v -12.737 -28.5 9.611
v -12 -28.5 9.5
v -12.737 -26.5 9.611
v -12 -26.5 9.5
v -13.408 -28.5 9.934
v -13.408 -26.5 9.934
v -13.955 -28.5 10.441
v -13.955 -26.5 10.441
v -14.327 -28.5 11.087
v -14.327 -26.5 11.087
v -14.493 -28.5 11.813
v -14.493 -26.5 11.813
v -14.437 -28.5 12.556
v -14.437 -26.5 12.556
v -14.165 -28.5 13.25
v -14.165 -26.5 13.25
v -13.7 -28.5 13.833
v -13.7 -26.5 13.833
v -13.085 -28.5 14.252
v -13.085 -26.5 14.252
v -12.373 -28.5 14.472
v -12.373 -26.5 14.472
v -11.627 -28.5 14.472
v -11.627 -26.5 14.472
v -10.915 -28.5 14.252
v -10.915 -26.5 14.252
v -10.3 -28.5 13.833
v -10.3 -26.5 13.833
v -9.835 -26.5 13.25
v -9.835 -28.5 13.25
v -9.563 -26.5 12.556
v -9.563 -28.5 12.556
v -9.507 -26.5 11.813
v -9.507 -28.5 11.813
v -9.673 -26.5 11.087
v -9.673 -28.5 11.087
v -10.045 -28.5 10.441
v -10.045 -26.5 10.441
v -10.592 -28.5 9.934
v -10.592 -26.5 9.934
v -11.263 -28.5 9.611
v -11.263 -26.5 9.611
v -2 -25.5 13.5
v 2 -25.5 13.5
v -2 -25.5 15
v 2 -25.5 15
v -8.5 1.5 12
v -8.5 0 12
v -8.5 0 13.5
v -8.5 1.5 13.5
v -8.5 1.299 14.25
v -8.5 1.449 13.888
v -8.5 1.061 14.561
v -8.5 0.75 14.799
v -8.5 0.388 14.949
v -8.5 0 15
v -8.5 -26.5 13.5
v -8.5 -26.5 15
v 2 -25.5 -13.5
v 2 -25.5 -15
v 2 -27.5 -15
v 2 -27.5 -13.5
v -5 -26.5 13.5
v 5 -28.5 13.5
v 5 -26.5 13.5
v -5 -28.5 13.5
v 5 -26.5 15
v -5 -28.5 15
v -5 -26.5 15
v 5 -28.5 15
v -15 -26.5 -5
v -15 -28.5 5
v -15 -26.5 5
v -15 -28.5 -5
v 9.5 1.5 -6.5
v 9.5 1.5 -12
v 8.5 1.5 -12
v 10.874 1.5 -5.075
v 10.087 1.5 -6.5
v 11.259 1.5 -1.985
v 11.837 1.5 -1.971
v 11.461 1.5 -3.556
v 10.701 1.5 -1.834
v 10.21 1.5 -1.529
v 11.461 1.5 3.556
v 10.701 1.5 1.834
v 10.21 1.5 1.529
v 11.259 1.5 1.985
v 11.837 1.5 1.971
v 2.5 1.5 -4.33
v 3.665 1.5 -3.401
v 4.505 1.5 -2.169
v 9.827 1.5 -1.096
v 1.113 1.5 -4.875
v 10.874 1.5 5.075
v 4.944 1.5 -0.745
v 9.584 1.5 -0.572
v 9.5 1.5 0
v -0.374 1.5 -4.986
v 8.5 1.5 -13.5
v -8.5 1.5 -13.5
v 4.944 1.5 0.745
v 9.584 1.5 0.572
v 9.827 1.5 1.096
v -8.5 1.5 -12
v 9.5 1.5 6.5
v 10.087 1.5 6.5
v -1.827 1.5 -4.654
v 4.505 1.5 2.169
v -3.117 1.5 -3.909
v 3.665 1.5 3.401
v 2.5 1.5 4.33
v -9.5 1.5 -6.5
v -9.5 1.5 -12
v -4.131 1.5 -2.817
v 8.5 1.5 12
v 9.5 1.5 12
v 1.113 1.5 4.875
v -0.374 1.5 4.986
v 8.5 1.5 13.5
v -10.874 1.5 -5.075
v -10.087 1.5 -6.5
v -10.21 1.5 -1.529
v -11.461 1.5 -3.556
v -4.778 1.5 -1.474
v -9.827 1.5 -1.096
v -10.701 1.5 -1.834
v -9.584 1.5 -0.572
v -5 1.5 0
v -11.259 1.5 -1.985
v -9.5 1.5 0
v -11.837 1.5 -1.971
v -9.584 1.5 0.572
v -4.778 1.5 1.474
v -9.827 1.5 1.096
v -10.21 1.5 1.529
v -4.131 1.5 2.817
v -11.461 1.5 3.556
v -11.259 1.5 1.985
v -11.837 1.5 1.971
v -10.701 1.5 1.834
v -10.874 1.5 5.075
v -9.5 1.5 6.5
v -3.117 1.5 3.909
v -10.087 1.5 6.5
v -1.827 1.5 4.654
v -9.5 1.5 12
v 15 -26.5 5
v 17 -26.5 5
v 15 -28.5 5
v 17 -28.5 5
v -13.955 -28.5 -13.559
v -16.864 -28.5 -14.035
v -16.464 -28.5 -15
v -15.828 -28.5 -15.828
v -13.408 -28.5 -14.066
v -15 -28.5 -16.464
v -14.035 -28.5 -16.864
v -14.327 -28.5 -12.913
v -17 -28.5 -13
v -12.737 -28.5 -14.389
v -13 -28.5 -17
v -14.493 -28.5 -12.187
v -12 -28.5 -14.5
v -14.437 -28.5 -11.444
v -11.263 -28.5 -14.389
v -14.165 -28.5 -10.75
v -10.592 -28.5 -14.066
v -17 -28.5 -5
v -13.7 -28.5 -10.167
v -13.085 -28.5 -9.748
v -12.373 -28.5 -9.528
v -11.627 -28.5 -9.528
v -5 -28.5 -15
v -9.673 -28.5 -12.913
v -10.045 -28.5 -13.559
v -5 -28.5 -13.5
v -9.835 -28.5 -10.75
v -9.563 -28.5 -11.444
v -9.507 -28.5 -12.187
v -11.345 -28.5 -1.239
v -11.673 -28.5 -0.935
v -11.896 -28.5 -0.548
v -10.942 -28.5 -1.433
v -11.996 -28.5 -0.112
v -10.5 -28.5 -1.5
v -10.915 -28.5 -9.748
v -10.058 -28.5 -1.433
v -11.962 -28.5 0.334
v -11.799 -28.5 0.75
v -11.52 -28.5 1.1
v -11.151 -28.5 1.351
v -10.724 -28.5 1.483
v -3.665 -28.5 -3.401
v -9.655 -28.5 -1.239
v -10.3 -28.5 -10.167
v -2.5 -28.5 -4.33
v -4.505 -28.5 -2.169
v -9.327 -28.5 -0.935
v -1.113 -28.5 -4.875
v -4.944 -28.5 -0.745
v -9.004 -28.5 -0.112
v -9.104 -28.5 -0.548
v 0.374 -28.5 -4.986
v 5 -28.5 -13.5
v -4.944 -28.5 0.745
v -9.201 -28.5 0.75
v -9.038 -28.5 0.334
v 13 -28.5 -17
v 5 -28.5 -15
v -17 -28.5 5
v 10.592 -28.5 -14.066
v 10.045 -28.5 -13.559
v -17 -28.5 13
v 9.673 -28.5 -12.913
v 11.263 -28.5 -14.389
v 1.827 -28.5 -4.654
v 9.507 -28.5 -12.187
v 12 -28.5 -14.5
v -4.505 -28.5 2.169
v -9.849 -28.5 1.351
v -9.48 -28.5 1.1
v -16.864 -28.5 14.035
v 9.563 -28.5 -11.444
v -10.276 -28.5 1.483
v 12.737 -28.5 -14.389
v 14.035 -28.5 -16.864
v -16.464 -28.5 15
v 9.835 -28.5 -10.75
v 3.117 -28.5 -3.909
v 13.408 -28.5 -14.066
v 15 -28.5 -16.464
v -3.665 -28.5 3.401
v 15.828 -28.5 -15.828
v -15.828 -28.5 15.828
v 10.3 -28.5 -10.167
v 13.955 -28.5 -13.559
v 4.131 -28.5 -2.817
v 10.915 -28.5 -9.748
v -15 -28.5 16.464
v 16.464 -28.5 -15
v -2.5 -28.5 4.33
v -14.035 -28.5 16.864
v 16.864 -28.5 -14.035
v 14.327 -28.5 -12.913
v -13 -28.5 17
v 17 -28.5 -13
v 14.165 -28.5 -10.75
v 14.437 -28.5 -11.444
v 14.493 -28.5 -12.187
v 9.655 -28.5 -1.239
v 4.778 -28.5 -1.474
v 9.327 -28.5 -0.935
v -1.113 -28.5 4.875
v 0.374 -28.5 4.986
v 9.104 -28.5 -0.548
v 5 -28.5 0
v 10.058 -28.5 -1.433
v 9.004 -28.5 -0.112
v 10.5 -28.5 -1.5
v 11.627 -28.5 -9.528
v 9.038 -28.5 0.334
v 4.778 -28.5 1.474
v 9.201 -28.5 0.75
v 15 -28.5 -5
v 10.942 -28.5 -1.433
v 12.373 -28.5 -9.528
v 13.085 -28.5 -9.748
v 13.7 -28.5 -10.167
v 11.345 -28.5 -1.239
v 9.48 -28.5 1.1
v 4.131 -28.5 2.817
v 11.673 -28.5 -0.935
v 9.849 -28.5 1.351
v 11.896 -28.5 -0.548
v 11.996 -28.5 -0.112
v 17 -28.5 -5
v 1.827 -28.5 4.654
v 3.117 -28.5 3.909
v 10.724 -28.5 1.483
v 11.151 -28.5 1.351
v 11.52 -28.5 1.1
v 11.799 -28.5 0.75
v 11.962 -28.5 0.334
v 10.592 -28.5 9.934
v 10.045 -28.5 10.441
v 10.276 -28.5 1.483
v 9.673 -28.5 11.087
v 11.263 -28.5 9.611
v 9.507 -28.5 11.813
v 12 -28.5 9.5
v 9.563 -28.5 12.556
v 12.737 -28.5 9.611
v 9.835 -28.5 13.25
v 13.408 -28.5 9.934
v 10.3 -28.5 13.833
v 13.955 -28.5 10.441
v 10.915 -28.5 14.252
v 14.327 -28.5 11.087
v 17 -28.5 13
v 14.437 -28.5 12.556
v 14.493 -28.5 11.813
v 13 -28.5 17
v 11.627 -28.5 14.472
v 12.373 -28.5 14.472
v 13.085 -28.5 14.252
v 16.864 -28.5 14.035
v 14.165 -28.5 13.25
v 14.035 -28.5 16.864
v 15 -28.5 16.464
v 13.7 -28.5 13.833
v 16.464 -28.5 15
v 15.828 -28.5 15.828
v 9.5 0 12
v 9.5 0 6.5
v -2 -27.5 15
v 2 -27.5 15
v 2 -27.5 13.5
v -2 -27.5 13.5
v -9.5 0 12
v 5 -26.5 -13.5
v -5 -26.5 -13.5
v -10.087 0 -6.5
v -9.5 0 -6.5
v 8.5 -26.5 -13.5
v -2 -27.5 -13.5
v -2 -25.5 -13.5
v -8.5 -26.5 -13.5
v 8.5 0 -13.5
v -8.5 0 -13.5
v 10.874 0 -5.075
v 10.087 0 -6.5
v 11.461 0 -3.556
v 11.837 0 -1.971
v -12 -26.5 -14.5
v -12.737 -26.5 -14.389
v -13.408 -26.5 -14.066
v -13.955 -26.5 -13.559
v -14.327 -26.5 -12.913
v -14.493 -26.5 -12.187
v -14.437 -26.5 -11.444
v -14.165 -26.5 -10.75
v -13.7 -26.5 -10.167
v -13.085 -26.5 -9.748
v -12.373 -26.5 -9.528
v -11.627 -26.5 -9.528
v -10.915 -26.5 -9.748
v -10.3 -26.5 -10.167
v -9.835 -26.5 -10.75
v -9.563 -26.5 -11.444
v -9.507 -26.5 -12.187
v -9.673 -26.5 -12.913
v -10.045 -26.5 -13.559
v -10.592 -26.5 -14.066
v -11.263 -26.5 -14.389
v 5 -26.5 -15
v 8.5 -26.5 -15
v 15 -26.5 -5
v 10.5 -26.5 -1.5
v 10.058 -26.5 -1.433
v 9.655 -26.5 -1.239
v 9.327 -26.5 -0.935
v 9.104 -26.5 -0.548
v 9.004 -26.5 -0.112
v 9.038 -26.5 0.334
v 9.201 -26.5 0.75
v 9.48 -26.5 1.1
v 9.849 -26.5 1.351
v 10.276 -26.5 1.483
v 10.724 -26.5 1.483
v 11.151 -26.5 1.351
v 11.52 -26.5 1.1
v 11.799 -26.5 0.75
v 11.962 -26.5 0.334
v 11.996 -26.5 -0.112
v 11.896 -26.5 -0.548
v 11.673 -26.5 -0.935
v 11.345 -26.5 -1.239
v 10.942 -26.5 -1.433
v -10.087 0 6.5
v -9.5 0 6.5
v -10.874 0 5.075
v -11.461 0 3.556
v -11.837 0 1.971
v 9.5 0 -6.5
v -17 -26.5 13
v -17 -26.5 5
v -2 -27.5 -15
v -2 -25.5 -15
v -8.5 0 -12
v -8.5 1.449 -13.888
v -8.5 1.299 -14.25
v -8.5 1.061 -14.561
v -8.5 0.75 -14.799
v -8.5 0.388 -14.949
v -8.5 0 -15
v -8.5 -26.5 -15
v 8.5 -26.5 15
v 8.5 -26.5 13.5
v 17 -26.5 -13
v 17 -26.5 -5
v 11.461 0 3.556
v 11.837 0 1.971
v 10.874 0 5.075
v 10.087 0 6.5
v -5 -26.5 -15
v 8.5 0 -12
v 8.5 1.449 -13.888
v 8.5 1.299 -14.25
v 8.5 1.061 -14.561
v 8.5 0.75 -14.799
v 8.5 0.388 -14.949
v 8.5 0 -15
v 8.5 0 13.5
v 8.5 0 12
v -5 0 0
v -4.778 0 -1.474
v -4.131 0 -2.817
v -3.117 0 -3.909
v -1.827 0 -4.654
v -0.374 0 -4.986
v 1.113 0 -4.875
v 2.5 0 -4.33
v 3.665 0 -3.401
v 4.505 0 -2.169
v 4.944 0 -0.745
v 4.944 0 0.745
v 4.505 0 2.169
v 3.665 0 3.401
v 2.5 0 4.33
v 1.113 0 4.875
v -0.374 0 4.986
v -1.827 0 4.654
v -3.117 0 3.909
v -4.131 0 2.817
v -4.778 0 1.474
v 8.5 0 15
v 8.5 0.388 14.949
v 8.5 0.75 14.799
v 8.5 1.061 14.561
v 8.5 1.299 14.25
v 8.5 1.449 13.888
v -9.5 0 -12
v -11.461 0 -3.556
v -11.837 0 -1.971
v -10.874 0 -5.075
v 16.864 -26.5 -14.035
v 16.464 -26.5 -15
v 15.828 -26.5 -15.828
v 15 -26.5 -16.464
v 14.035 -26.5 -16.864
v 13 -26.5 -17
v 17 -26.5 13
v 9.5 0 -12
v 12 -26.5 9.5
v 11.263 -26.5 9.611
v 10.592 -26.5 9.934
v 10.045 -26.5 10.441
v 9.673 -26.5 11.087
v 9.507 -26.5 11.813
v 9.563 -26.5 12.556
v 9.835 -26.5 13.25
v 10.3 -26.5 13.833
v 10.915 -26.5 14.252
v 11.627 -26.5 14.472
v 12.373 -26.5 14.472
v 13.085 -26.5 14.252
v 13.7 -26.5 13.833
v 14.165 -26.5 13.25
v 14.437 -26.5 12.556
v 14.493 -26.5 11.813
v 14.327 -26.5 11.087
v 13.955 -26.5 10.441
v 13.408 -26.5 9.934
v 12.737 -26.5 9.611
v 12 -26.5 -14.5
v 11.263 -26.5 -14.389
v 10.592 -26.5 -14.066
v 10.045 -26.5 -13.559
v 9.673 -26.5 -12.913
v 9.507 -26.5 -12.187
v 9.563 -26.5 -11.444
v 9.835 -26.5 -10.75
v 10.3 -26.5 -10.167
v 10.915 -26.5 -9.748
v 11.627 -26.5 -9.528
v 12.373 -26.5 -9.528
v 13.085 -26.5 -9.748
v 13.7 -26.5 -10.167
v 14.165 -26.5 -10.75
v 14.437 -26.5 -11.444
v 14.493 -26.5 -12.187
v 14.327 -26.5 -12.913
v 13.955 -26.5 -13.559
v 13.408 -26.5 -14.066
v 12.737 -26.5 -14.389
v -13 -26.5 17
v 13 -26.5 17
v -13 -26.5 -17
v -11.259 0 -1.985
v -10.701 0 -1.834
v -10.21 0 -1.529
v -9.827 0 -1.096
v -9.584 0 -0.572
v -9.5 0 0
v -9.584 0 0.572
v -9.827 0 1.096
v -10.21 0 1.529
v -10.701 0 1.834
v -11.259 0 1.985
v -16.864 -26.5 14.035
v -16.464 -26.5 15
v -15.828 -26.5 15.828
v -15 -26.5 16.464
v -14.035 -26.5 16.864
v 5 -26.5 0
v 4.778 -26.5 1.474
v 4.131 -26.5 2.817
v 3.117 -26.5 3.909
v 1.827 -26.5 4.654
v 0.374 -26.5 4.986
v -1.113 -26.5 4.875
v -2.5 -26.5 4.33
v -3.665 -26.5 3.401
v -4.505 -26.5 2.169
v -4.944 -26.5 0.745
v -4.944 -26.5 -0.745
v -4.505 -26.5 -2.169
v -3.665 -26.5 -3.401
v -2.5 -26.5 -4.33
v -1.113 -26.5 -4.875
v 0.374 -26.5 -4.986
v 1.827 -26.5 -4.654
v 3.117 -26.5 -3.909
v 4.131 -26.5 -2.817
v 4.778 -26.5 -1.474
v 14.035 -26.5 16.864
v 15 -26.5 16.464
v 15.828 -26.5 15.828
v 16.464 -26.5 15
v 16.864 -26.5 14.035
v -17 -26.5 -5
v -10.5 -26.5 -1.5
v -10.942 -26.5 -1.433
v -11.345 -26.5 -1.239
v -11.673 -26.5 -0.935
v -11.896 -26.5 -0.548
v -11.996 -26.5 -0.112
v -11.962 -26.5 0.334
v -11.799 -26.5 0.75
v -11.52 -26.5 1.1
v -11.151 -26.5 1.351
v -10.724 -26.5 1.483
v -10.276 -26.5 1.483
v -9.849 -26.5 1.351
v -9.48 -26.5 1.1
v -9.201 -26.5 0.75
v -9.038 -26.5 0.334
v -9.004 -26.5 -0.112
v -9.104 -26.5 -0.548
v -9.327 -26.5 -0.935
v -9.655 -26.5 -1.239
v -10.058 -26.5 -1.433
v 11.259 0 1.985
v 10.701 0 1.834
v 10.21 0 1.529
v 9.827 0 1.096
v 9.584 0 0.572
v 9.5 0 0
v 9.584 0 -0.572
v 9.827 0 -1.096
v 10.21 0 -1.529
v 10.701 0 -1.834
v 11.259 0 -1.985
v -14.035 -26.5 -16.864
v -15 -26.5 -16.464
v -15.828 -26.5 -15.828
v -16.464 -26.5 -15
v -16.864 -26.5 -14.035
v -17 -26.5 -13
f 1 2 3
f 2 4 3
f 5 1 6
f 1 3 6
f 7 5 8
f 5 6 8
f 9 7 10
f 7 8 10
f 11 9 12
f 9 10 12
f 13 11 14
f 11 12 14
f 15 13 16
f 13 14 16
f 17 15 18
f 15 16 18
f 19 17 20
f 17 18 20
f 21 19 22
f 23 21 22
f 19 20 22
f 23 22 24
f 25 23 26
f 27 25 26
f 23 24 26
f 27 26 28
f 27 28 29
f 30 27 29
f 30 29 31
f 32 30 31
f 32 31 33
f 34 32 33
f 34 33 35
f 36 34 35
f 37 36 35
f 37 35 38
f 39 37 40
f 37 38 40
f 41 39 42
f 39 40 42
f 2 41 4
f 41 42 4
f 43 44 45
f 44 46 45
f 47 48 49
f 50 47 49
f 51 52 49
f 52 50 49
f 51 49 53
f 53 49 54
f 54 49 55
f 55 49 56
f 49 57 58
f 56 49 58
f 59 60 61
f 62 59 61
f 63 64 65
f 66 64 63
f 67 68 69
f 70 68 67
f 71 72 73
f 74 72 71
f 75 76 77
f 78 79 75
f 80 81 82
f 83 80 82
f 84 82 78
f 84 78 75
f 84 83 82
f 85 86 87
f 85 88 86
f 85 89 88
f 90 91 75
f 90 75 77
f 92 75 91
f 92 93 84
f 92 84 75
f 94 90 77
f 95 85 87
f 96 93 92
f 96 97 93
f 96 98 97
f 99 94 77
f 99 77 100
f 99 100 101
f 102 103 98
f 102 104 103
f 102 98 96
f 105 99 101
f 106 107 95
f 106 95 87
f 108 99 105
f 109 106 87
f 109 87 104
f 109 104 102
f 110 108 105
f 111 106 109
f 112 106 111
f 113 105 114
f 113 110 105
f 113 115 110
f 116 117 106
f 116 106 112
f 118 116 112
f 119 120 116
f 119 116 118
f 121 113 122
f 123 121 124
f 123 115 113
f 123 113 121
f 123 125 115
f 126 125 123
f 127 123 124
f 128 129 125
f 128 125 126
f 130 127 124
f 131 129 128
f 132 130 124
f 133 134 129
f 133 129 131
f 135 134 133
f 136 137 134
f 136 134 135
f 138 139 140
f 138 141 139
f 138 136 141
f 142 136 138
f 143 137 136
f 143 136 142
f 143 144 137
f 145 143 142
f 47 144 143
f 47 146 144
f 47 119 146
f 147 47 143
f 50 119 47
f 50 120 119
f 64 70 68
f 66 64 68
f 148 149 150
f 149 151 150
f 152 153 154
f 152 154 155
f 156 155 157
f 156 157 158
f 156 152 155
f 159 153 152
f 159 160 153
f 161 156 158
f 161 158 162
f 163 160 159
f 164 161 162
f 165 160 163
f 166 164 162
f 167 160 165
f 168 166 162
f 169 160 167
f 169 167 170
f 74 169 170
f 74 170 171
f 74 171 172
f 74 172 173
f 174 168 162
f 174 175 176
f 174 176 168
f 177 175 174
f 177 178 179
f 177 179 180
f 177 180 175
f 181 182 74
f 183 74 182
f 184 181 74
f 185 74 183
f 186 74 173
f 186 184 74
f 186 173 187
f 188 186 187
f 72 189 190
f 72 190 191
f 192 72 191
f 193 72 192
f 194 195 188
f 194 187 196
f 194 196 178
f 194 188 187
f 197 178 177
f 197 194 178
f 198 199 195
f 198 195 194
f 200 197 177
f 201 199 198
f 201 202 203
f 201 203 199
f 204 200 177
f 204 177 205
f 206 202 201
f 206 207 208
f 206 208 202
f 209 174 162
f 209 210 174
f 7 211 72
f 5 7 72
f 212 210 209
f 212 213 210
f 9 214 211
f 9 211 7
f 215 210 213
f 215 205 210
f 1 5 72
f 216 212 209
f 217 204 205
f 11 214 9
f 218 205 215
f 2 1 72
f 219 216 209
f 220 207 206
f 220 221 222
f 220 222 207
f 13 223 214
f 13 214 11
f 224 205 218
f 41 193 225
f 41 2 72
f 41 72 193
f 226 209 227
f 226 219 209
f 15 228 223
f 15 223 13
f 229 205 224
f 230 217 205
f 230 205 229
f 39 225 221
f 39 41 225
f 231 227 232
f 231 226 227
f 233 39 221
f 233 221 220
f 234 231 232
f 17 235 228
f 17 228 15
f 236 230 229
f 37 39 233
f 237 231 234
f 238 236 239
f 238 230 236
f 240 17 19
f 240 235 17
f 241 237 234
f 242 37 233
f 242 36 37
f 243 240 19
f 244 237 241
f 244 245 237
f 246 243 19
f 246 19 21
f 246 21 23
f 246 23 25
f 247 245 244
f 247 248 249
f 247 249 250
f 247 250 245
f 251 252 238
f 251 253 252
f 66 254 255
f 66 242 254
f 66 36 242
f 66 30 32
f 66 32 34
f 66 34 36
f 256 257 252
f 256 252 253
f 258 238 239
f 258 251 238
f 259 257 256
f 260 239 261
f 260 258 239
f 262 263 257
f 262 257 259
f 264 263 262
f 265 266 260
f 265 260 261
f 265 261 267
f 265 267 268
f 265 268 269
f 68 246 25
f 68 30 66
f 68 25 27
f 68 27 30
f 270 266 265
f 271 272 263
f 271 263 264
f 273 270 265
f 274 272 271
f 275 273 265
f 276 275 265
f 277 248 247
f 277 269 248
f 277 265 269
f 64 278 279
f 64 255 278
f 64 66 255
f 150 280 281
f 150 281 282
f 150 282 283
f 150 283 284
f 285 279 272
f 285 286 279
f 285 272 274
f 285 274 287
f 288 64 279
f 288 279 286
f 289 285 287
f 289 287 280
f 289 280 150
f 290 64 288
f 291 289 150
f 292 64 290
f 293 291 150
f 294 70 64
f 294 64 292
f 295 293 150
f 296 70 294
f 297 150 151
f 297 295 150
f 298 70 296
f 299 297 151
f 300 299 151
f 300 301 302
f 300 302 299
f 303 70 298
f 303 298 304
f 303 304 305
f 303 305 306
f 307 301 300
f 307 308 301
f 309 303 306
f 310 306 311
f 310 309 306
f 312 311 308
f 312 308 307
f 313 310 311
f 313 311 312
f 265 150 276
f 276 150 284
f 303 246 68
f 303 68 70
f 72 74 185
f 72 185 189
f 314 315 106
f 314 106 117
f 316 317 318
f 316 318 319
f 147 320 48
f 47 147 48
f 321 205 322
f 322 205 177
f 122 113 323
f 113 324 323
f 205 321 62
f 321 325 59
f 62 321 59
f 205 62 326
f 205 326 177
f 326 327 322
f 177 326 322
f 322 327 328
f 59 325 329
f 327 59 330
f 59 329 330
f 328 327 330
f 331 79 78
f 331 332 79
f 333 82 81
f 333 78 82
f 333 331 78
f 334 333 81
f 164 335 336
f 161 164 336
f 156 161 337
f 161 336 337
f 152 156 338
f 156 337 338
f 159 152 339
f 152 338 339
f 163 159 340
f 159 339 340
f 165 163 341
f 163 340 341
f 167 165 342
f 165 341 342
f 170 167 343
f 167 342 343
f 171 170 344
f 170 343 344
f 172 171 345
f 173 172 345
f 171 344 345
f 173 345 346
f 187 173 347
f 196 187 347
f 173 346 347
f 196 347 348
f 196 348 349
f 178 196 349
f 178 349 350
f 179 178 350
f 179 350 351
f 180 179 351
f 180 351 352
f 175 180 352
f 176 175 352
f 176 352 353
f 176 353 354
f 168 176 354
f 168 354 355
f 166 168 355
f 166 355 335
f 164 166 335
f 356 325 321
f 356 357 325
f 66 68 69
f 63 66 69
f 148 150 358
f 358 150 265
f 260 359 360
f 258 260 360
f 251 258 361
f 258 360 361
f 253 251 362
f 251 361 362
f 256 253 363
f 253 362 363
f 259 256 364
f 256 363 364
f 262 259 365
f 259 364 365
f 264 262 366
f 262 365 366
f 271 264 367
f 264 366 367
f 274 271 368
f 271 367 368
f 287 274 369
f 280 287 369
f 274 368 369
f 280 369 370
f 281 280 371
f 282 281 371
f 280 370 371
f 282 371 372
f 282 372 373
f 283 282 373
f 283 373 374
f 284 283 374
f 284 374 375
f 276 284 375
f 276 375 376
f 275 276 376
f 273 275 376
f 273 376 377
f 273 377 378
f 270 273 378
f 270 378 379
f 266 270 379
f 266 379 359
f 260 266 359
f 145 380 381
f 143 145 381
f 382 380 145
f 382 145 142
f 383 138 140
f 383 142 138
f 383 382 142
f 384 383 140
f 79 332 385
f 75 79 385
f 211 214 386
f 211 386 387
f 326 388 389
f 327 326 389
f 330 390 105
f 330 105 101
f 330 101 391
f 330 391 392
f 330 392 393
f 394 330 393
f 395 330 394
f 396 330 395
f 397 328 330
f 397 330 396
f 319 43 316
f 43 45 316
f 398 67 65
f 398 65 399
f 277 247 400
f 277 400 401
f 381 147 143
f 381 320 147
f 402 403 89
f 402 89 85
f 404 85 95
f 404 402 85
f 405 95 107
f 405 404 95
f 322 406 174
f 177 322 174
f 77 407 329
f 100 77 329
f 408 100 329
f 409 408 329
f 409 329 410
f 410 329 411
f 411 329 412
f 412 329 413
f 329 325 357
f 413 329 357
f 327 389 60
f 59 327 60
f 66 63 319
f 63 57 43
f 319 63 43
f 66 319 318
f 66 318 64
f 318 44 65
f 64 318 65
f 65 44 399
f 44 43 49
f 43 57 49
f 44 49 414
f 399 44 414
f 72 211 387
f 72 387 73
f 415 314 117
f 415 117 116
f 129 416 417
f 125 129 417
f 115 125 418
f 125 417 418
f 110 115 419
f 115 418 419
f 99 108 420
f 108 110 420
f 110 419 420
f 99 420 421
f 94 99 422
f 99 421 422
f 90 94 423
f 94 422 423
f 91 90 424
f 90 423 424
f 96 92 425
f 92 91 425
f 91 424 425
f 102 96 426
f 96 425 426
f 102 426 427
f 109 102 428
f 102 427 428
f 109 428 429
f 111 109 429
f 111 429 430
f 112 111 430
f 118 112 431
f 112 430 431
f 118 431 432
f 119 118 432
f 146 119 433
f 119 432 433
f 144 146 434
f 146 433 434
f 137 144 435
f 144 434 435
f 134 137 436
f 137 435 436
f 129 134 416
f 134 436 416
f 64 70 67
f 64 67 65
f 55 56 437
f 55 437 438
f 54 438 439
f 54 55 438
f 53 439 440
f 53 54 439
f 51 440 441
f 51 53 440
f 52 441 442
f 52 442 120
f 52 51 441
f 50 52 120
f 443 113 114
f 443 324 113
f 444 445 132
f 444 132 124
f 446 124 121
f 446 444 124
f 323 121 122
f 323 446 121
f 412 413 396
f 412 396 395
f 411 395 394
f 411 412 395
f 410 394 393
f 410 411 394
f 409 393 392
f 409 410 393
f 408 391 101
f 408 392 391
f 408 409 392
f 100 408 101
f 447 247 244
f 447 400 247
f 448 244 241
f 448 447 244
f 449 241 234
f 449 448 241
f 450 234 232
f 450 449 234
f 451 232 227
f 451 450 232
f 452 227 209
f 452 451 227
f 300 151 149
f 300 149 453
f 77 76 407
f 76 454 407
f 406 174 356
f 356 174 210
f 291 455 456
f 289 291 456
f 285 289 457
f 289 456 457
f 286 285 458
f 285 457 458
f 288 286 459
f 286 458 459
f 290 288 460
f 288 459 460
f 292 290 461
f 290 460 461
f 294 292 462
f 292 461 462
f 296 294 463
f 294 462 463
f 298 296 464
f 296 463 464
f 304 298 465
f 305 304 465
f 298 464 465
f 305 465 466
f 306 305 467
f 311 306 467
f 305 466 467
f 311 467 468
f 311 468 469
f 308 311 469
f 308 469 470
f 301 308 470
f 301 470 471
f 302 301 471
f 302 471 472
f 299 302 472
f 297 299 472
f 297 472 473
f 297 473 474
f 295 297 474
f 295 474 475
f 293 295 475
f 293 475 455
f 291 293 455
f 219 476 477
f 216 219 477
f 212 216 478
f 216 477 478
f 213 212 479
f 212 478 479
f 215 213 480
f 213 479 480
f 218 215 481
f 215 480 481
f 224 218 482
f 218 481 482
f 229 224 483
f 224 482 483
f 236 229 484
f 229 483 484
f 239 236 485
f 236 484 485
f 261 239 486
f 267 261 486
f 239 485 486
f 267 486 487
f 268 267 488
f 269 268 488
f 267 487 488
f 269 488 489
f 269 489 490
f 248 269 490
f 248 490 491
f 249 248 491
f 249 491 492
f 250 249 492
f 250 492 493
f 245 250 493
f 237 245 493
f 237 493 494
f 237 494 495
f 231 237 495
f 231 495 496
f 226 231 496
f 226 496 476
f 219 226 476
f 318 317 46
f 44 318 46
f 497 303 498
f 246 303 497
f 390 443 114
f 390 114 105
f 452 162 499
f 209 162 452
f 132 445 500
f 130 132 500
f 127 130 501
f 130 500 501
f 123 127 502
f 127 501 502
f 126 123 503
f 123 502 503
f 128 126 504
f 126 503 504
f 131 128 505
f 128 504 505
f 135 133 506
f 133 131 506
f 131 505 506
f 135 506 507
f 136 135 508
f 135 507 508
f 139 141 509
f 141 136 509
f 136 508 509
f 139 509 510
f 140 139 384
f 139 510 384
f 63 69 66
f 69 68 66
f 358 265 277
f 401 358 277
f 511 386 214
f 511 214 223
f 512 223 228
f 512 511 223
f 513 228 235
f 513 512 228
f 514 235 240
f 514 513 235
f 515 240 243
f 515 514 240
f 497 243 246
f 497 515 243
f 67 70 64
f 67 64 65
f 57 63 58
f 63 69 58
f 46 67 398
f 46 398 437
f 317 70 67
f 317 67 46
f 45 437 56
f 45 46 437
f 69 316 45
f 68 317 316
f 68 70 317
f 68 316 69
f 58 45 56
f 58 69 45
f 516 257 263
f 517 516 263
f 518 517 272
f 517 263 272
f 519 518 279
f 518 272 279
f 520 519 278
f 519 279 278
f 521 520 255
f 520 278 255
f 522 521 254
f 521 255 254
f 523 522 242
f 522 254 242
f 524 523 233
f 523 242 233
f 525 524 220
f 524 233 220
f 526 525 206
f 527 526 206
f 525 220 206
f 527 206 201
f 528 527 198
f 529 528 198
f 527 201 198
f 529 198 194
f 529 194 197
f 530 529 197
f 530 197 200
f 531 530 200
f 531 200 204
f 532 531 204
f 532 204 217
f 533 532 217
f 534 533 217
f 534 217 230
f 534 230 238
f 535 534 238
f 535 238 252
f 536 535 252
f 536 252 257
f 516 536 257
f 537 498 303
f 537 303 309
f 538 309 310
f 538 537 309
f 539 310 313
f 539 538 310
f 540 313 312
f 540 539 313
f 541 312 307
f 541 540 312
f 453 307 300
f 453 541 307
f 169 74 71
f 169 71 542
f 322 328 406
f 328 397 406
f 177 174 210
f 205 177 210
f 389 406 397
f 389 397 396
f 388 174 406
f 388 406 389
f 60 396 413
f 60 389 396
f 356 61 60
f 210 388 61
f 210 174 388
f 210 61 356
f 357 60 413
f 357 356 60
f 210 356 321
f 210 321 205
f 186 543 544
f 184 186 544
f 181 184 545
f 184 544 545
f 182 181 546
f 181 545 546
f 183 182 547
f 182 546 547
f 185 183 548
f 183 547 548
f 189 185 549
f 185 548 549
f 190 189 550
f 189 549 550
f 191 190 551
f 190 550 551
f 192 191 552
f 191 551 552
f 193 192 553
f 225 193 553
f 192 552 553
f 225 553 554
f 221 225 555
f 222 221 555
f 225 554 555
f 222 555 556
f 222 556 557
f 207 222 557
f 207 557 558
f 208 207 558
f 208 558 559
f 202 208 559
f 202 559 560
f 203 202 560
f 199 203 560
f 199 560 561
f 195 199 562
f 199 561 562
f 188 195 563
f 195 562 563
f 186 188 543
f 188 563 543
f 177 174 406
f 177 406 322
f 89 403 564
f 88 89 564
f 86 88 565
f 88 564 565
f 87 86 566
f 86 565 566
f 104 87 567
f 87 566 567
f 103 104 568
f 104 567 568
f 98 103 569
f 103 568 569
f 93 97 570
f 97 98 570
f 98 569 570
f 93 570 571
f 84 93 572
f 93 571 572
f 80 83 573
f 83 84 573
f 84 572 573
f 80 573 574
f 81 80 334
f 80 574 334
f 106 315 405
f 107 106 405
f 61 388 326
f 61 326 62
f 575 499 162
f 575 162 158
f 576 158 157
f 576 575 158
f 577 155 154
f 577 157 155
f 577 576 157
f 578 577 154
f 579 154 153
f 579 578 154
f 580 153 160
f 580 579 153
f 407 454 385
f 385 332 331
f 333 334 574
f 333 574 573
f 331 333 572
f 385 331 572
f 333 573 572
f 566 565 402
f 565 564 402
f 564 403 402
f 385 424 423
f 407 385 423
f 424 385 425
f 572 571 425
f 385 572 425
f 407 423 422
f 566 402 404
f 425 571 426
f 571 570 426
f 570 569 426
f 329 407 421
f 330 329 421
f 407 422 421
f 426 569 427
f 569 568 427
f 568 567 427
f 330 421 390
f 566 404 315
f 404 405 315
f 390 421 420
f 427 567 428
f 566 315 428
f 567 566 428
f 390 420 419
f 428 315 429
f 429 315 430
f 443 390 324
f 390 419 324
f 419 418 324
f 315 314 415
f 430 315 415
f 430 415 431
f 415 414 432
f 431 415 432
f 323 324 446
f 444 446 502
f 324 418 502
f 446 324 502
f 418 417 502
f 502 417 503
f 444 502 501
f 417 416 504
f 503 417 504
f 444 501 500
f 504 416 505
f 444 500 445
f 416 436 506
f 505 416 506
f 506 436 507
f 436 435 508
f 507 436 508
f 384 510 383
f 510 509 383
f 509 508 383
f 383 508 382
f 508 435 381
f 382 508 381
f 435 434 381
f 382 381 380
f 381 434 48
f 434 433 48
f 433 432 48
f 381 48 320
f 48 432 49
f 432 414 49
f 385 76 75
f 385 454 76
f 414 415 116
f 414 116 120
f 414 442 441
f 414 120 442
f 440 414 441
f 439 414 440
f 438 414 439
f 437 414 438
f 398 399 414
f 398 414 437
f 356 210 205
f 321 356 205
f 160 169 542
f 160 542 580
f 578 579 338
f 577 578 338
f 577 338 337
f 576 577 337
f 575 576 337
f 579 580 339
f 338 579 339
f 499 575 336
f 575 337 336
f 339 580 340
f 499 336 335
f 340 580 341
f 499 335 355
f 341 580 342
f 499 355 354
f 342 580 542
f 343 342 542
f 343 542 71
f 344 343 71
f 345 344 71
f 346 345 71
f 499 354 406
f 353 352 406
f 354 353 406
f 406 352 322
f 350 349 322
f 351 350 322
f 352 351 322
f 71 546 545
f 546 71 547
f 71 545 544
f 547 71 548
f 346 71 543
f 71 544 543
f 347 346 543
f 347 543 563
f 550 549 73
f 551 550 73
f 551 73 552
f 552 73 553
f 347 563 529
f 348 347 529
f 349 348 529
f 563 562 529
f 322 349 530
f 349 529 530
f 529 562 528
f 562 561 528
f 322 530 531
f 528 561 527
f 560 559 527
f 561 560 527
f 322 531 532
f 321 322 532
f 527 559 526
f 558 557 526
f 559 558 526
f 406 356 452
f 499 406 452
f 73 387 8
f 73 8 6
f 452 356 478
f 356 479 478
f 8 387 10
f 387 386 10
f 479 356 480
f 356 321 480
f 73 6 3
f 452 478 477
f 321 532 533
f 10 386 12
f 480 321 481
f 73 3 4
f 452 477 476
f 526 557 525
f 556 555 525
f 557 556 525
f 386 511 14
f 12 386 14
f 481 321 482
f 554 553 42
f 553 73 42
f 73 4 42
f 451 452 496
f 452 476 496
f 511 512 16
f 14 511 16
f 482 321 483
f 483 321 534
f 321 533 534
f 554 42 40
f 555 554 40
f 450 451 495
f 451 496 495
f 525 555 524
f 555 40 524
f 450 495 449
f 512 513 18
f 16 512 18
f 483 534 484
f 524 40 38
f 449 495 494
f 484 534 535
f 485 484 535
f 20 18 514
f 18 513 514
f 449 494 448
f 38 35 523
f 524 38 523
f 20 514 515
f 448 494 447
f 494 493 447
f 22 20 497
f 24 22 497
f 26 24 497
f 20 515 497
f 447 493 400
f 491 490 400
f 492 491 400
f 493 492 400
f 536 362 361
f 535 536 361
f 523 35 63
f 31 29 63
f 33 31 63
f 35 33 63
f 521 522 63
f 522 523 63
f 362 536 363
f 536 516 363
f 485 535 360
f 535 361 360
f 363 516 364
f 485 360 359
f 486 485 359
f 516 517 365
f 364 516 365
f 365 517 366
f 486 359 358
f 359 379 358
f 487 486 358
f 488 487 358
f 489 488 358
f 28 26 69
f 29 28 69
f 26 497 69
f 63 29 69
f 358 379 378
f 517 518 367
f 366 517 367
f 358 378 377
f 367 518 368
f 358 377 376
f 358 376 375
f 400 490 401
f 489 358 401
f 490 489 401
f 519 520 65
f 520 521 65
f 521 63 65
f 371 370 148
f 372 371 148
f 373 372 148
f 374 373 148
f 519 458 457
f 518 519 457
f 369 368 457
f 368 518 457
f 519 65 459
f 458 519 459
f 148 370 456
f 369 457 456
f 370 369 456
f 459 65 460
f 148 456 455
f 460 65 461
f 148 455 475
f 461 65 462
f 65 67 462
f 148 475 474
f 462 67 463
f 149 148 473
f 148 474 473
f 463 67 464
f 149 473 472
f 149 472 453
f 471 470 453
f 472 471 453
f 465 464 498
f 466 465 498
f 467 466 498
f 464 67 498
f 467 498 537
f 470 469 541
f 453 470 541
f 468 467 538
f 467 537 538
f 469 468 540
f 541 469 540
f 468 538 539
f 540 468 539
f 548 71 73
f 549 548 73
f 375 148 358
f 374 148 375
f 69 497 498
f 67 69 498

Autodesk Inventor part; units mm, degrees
ref_plane "YZ Plane" through (0, 0, 0) normal (1, 0, 0) x (0, 1, 0)
ref_plane "XZ Plane" through (0, 0, 0) normal (0, 1, 0) x (-1, 0, 0)
ref_plane "XY Plane" through (0, 0, 0) normal (0, 0, 1) x (1, 0, 0)
sketch "Sketch1" plane through (0, 0, 0) normal (0, 1, 0) x (-1, 0, 0)
  line L0 (-9.5, 15) -> (9.5, 15)
  line L1 (9.5, -15) -> (-9.5, -15)
  line L2 (-9.5, 15) -> (9.5, -15) construction
  line L3 (9.5, 15) -> (-9.5, -15) construction
  arc A0 (11.837, 1.9714) -> (11.837, -1.9714) centre (11.5, 0) ccw
  arc A1 (-11.837, -1.9714) -> (-11.837, 1.9714) centre (-11.5, 0) ccw
  arc A2 (11.837, 1.9714) -> (9.5, 7.3314) centre (0, 0) ccw
  arc A3 (-9.5, 7.3314) -> (-11.837, 1.9714) centre (0, 0) ccw
  arc A4 (-11.837, -1.9714) -> (-9.5, -7.3314) centre (0, 0) ccw
  arc A5 (9.5, -7.3314) -> (11.837, -1.9714) centre (0, 0) ccw
  line L4 (9.5, 15) -> (9.5, 6.5)
  line L5 (9.5, -6.5) -> (9.5, -15)
  line L6 (-9.5, -15) -> (-9.5, -6.5)
  line L7 (-9.5, 6.5) -> (-9.5, 15)
  circle A6 centre (0, 0) radius 5
  line L8 (9.5, -12) -> (8.5, -12)
  line L9 (8.5, -12) -> (8.5, -15)
  line L10 (8.5, -15) -> (9.5, -15)
  line L11 (9.5, -15) -> (9.5, -12)
  line L12 (-8.5, -15) -> (-9.5, -15)
  line L13 (-9.5, -15) -> (-9.5, -12)
  line L14 (-9.5, -12) -> (-8.5, -12)
  line L15 (-8.5, -12) -> (-8.5, -15)
  line L16 (9.5, 12) -> (8.5, 12)
  line L17 (8.5, 12) -> (8.5, 15)
  line L18 (8.5, 15) -> (9.5, 15)
  line L19 (9.5, 15) -> (9.5, 12)
  line L20 (-8.5, 15) -> (-9.5, 15)
  line L21 (-9.5, 15) -> (-9.5, 12)
  line L22 (-9.5, 12) -> (-8.5, 12)
  line L23 (-8.5, 12) -> (-8.5, 15)
  line L24 (14.0753, 6.5) -> (-14.0753, 6.5)
  line L25 (-14.0753, 6.5) -> (-14.0753, -6.5)
  line L26 (-14.0753, -6.5) -> (14.0753, -6.5)
  line L27 (14.0753, -6.5) -> (14.0753, 6.5)
  line L28 (14.0753, 6.5) -> (-14.0753, -6.5) construction
  line L29 (-14.0753, 6.5) -> (14.0753, -6.5) construction
  point P0 (0, 0)
  point P1 (9.5, 11.1657)
  point P2 (0, -15)
  point P3 (0, 15)
  point P4 (0, 0)
  point P5 (9, -12)
  point P6 (-10.0871, 6.5)
  point P7 (-10.0871, -6.5)
  point P8 (10.0871, -6.5)
  point P9 (10.0871, 6.5)
  dimension "d0" = 19
  dimension "d1" = 30
  dimension "d2" = 4
  dimension "d3" = 4
  dimension "d17" = 10
  dimension "d21" = 19
  dimension "d22" = 15
  dimension "d23" = 12
  dimension "d24" = 12
  dimension "d25" = 12
  dimension "d26" = 12
  dimension "d27" = 11.5
  dimension "d28" = 11.5
  dimension "d29" = 17
  dimension "d30" = 8.5
  dimension "d31" = 12
  dimension "d32" = 12
  dimension "d33" = 13
extrude "Extrusion1" add sketch "Sketch1" along normal blind 1.5 contours L0 L17 L16 L4 L24 L7 L22 L23 | L24 A2 A0 A5 L26 A4 A1 A3 | L6 L26 L5 L8 L9 L1 L15 L14
sketch "Sketch2" plane through (-9.5, 0, 15) normal (0, 0, 1) x (1, 0, 0)
  line L0 (7.5, -28.5) -> (7.5, -26.5)
  line L1 (11.5, -28.5) -> (11.5, -26.5)
  line L2 (7.5, -26.5) -> (11.5, -26.5)
  line L3 (1, 1.5) -> (18, 1.5)
  line L4 (18, 1.5) -> (18, -28.5)
  line L5 (18, -28.5) -> (1, -28.5)
  line L6 (1, -28.5) -> (1, 1.5)
  line L7 (18, 0) -> (18, 1.5) projected
  line L8 (18, -28.5) -> (14.5, -28.5)
  line L9 (14.5, -28.5) -> (14.5, -26.5)
  line L10 (14.5, -26.5) -> (18, -26.5)
  line L11 (18, -26.5) -> (18, -28.5)
  line L12 (1, -28.5) -> (4.5, -28.5)
  line L13 (4.5, -28.5) -> (4.5, -26.5)
  line L14 (4.5, -26.5) -> (1, -26.5)
  line L15 (1, -26.5) -> (1, -28.5)
  line L16 (1, 0) -> (1, 1.5) projected
  line L17 (7.5, -26.5) -> (11.5, -26.5)
  line L18 (11.5, -26.5) -> (11.5, -25.5)
  line L19 (11.5, -25.5) -> (7.5, -25.5)
  line L20 (7.5, -25.5) -> (7.5, -26.5)
  line L21 (7.5, -28.5) -> (11.5, -28.5)
  line L22 (11.5, -28.5) -> (11.5, -27.5)
  line L23 (11.5, -27.5) -> (7.5, -27.5)
  line L24 (7.5, -27.5) -> (7.5, -28.5)
  point P0 (9.5, 1.5)
  point P1 (9.5, -26.5)
  dimension "d36" = 30
  dimension "d37" = 4
  dimension "d38" = 2
  dimension "d39" = 3
  dimension "d40" = 3
  dimension "d48" = 1
  dimension "d49" = 1
extrude "Extrusion2" add sketch "Sketch2" against normal blind 1.5 contours L5 L13 L14 L6 L3 L4 L10 L9 L1 L18 L19 L20 L0 | L0 L23 L1 L5
mirror "Mirror2" about plane through (0, 0, 0) normal (0, 0, 1) of "Extrusion2"
fillet "Fillet1" radius 1.5 2 edges at (0, 1.5, 15) (0, 1.5, -15)
sketch "Sketch4" plane through (2, -28.5, 15) normal (0, -1, 0) x (1, 0, 0)
  line L0 (-19, -32) -> (15, -32)
  line L1 (15, -32) -> (15, 2)
  line L2 (15, 2) -> (-19, 2)
  line L3 (-19, 2) -> (-19, -32)
  line L4 (-19, -32) -> (15, 2) construction
  line L5 (15, -32) -> (-19, 2) construction
  point P0 (-2, -15)
  dimension "d44" = 34
  dimension "d45" = 34
extrude "Extrusion3" add sketch "Sketch4" against normal blind 2 separate body
sketch "Sketch5" plane through (2, -28.5, 15) normal (0, -1, 0) x (1, 0, 0)
  line L0 (-14, -27) -> (10, -27)
  line L1 (10, -27) -> (10, -3)
  line L2 (10, -3) -> (-14, -3)
  line L3 (-14, -3) -> (-14, -27)
  line L4 (-14, -27) -> (10, -3) construction
  line L5 (10, -27) -> (-14, -3) construction
  point P0 (-2, -15)
  dimension "d50" = 24
  dimension "d51" = 24
hole "Hole1" at (-12, -28.5, 12) at (12, -28.5, 12) at (12, -28.5, -12) at (-12, -28.5, -12) direction (0, 1, 0) diameter 5 end through all bodies 2
fillet "Fillet2" radius 4 4 edges at (17, -27.5, 17) (-17, -27.5, 17) (-17, -27.5, -17) (17, -27.5, -17)
sketch "Sketch6" plane through (2, -28.5, 15) normal (0, -1, 0) x (1, 0, 0)
  line L0 (-7, 0) -> (3, 0) projected
  line L1 (-7, 0) -> (-7, -1.5) projected
  line L2 (3, -1.5) -> (-7, -1.5) projected
  line L3 (3, 0) -> (3, -1.5) projected
  line L4 (-7, -30) -> (3, -30) projected
  line L5 (3, -30) -> (3, -28.5) projected
  line L6 (3, -28.5) -> (-7, -28.5) projected
  line L7 (-7, -30) -> (-7, -28.5) projected
  point P0 (-2, -15)
extrude "Extrusion4" cut sketch "Sketch6" against normal through all bodies 2
sketch "Sketch7" plane through (2, -28.5, 15) normal (0, -1, 0) x (1, 0, 0)
  line L0 (-7, -30) -> (3, -30) projected
  line L1 (3, -30) -> (3, -28.5) projected
  line L2 (3, -28.5) -> (-7, -28.5) projected
  line L3 (-7, -28.5) -> (-7, -30) projected
  line L4 (-7, 0) -> (-7, -1.5) projected
  line L5 (-7, -1.5) -> (3, -1.5) projected
  line L6 (3, -1.5) -> (3, 0) projected
  line L7 (3, 0) -> (-7, 0) projected
  arc A0 (-19, -28) -> (-15, -32) centre (-15, -28) ccw projected
  line L8 (-19, -28) -> (-19, -2) projected
  arc A1 (-15, 2) -> (-19, -2) centre (-15, -2) ccw projected
  line L9 (-15, 2) -> (11, 2) projected
  arc A2 (15, -2) -> (11, 2) centre (11, -2) ccw projected
  line L10 (15, -2) -> (15, -28) projected
  arc A3 (11, -32) -> (15, -28) centre (11, -28) ccw projected
  line L11 (11, -32) -> (-15, -32) projected
  circle A4 centre (-14, -27) radius 2.5 projected
  circle A5 centre (10, -27) radius 2.5 projected
  circle A6 centre (10, -3) radius 2.5 projected
  circle A7 centre (-14, -3) radius 2.5 projected
  line L12 (-19, -10) -> (-17, -10)
  line L13 (-17, -10) -> (-17, -20)
  line L14 (-17, -20) -> (-19, -20)
  line L15 (-19, -20) -> (-19, -10)
  line L16 (15, -10) -> (13, -10)
  line L17 (13, -10) -> (13, -20)
  line L18 (13, -20) -> (15, -20)
  line L19 (15, -20) -> (15, -10)
  point P0 (-2, -15)
  point P1 (-19, -15)
  point P2 (15, -20)
  dimension "d62" = 2
  dimension "d63" = 2
  dimension "d64" = 10
extrude "Extrusion5" cut sketch "Sketch7" against normal through all contours L8 L12 L13 L14 | L18 L17 L16 L10 bodies 2
sketch "Sketch8" plane through (2, -28.5, 15) normal (0, -1, 0) x (1, 0, 0)
  circle A0 centre (-2, -15) radius 5 projected
  point P0 (-2, -15)
extrude "Extrusion6" cut sketch "Sketch8" against normal through all bodies 2
sketch "Sketch9" plane through (2, -28.5, 15) normal (0, -1, 0) x (1, 0, 0)
  line L0 (-12.5, -15) -> (8.5, -15)
  line L1 (11, 2) -> (-15, 2) projected
  point P0 (-2, -15)
  point P1 (-2, -15)
  dimension "d69" = 21
hole "Hole2" at (-10.5, -28.5, 0) at (10.5, -28.5, 0) direction (0, 1, 0) diameter 3 end through all bodies 2
equation "\"d21\" = d0"
equation "\"d22\" = 0.5 * d1"
equation "\"d28\" = d27"
equation "\"d30\" = 0.5 * d29"
equation "\"d32\" = d31"
equation "\"d40\" = d39"
equation "\"d45\" = d44"
equation "\"d57\" = Thickness"
equation "\"d63\" = d62"
equation "\"BendReliefWidth\" = Thickness"
equation "\"BendReliefDepth\" = 0.5 * Thickness"
equation "\"CornerReliefSize\" = 4 * Thickness"
equation "\"MinimumRemnant\" = 2 * Thickness"
equation "\"GapSize\" = Thickness"
equation "\"d4\" = Thickness"
equation "\"Thickness\" = 1.5"
properties part number "Frame" material "Steel, Galvanized"
